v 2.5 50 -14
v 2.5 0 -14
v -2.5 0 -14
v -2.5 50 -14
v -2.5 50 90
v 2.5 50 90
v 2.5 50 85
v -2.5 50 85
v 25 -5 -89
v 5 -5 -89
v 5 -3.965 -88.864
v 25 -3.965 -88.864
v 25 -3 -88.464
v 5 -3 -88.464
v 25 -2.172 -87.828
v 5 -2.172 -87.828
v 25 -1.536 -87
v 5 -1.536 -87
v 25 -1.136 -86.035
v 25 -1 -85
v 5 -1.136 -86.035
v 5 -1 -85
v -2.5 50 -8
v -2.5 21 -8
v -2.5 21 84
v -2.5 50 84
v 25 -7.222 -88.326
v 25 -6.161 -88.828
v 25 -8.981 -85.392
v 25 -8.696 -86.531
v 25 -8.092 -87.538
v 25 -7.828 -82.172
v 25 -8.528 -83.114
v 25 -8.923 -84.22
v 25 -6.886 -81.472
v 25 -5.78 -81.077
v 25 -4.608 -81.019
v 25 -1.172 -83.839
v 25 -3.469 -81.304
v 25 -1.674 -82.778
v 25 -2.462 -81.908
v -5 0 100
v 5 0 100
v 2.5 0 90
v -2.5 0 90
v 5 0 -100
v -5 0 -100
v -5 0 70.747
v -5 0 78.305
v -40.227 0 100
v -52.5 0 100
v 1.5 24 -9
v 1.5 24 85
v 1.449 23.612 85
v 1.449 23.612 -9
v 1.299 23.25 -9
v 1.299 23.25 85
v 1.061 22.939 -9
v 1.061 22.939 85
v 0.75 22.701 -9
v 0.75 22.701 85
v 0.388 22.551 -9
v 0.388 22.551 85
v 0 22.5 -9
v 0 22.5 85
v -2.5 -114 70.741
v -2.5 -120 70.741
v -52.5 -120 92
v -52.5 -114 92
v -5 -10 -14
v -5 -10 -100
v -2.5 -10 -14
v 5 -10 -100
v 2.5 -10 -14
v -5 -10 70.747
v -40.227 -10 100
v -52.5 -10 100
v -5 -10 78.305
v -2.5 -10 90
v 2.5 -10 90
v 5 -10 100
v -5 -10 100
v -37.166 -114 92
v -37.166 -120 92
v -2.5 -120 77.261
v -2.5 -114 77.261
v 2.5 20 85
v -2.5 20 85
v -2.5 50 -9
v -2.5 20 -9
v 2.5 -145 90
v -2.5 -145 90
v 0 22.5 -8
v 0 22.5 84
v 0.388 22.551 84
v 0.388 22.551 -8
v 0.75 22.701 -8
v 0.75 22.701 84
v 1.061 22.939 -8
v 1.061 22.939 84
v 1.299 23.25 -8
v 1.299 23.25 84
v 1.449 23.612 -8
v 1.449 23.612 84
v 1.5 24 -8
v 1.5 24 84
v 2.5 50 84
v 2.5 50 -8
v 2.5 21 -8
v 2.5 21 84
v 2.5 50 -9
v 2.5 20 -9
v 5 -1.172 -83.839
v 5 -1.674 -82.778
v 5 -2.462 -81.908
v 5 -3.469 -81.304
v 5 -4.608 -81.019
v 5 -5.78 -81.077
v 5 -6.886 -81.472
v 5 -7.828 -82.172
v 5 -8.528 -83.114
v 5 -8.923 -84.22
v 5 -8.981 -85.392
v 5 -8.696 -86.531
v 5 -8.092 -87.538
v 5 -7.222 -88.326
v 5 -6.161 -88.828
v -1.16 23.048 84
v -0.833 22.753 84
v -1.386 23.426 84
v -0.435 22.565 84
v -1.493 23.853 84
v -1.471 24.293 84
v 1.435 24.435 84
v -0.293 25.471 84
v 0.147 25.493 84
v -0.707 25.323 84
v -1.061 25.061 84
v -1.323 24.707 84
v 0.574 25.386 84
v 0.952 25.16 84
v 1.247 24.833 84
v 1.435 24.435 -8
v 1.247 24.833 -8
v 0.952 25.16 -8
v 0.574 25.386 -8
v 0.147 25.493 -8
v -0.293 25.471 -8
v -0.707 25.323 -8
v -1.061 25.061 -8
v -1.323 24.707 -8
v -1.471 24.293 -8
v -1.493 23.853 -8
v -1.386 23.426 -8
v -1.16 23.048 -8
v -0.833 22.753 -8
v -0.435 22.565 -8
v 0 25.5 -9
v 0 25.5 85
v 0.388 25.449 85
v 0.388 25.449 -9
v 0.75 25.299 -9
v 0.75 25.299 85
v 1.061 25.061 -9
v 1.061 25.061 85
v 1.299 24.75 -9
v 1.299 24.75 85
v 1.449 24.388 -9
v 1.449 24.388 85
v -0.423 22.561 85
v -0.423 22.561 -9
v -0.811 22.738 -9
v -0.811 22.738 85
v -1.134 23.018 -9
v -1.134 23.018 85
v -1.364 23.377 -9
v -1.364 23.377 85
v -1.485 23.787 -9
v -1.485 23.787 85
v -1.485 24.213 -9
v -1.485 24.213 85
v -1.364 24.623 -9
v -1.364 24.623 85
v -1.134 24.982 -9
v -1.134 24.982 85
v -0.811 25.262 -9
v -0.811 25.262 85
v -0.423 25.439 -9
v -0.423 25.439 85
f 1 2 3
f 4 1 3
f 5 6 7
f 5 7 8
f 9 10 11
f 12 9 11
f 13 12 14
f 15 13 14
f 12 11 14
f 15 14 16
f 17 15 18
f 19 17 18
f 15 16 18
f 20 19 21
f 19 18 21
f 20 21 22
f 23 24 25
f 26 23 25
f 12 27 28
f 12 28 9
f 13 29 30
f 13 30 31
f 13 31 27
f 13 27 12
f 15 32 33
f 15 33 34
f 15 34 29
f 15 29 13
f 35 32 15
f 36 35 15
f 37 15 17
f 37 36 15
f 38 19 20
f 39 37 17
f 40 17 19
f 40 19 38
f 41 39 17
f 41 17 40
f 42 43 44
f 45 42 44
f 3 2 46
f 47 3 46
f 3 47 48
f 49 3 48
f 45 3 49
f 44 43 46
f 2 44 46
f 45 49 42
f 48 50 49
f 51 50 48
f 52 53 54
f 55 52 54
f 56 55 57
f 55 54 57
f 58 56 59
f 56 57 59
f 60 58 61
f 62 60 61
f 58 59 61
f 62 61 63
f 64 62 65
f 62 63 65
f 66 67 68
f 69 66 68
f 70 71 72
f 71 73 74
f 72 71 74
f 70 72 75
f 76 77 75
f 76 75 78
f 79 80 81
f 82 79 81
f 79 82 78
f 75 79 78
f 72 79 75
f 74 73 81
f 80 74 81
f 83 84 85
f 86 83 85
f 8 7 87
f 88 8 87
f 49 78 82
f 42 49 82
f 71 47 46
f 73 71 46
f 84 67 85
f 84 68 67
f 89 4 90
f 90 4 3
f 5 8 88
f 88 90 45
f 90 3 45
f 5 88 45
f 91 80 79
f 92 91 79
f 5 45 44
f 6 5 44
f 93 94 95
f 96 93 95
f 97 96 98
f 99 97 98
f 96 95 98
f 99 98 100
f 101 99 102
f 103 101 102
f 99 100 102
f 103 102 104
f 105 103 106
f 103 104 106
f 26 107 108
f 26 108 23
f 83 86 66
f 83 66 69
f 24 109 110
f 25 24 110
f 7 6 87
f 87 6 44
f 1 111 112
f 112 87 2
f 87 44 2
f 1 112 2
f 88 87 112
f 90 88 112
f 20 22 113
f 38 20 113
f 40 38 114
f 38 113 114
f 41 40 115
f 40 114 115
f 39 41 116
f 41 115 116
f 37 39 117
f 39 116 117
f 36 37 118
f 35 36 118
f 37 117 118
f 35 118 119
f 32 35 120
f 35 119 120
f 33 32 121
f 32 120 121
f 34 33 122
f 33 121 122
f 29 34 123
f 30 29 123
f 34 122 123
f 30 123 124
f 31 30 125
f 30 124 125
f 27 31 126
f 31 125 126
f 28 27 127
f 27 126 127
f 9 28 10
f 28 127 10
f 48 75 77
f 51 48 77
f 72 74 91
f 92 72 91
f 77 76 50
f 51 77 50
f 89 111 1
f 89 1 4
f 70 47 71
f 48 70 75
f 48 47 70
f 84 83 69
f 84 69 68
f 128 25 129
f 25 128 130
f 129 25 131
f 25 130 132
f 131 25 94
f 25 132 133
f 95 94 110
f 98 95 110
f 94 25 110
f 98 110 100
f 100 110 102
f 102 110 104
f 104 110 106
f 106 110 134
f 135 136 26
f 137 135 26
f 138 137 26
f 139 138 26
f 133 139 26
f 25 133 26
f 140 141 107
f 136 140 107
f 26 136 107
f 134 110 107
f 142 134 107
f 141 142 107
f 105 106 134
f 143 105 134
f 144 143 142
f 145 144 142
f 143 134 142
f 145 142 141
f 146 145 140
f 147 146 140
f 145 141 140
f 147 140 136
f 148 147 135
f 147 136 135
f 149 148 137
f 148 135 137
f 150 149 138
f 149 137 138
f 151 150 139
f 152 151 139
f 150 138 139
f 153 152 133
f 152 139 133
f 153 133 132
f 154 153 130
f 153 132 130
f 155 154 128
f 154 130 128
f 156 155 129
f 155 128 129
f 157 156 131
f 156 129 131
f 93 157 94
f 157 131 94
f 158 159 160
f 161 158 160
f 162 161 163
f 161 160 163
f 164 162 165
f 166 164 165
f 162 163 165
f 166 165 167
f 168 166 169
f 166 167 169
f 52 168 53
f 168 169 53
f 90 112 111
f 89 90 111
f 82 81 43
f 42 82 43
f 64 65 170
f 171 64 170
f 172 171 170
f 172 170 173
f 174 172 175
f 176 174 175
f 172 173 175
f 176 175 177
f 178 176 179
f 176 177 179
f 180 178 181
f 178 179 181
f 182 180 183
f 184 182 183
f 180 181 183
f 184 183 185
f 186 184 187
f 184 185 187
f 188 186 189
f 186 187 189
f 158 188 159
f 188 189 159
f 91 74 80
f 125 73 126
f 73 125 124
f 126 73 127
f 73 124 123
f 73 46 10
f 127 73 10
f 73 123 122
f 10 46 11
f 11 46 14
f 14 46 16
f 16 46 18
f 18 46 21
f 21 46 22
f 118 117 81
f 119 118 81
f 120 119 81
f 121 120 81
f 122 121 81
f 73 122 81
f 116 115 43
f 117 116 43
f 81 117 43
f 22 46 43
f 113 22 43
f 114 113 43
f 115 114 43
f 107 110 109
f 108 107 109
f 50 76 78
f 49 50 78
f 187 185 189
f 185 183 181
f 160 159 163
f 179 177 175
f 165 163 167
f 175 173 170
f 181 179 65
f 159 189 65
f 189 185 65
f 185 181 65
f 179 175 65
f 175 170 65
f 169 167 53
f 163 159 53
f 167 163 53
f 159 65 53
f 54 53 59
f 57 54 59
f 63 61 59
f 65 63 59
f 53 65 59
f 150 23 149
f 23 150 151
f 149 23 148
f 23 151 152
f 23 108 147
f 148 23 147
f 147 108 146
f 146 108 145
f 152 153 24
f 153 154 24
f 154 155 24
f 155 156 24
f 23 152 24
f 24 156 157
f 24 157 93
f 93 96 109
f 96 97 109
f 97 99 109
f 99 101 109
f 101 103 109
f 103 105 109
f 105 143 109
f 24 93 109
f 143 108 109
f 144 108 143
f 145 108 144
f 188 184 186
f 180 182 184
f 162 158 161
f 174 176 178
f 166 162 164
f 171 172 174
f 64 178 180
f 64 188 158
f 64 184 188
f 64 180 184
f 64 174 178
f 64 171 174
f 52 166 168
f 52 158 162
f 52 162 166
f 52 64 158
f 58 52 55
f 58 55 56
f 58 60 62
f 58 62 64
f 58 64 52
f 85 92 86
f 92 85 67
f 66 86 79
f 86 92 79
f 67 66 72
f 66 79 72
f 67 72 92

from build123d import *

# Parameters (mm, degrees)
F0_W      = 10
F0_H      = 200
F1_DEPTH  = 10
F3_DEPTH  = 135
F5_DEPTH  = 7.501
F6_W      = 6
F6_H      = 6
F6_H_2    = 7.259
F6_H_3    = 2
F7_DEPTH  = 50
F9_DEPTH  = 6
F10_W     = 5
F10_H     = 10
F10_H_2   = 9.253
F11_DEPTH = 47.5
F13_DEPTH = 10
F15_DEPTH = 20
F17_DEPTH = 50
F19_DEPTH = 5
F21_DEPTH = 92
F23_DEPTH = 94


# Not quite as in the source:
# - a feature names something its author has since deleted; it is built from what else it names


with BuildPart() as f1:
    # F0 (on Front) → F1 (new body)
    with BuildSketch(Plane.XZ):
        Rectangle(F0_W, F0_H)
    extrude(amount=F1_DEPTH)

    # F2 (on face) → F3 (join)
    with BuildSketch(Plane.XZ.offset(10)):
        Polygon((2.5, 90), (0, 90), (-2.5, 90), (-2.5, -14), (0, -14), (2.5, -14), align=None)
    extrude(amount=F3_DEPTH)

    # F4 (on face) → F5 (cut, through all)
    with BuildSketch(Plane.YZ.offset(2.5)):
        Polygon((-10, -14), (-145, 90), (-145, -14), align=None)
    extrude(amount=-F5_DEPTH, mode=Mode.SUBTRACT)

    # F6 (on face) → F7 (join)
    with BuildSketch(Plane(origin=(-2.5, 0, 0), x_dir=(0, -1, 0), z_dir=(-1, 0, 0))):
        with Locations((117, 87)):
            Rectangle(F6_W, F6_H)
        with Locations((117, 73.741)):
            Rectangle(F6_W, F6_H)
        with Locations((117, 80.3705)):
            Rectangle(F6_W, F6_H_2)
        with Locations((117, 91)):
            Rectangle(F6_W, F6_H_3)
    extrude(amount=F7_DEPTH)

    # F8 (on face) → F9 (cut, through all)
    with BuildSketch(Plane.XZ.offset(120)):
        Polygon((-52.5, 70.741), (-2.5, 70.741), (-52.5, 92), align=None)
        Polygon((-37.1657494443, 92), (-2.5, 77.2608166513), (-2.5, 90), (-2.5, 92), align=None)
    extrude(amount=-F9_DEPTH, mode=Mode.SUBTRACT)

    # F10 (on face) → F11 (join)
    with BuildSketch(Plane(origin=(-5, 0, 0), x_dir=(0, -1, 0), z_dir=(-1, 0, 0))):
        with Locations((7.5, 75.747)):
            Rectangle(F10_W, F10_H)
        with Locations((2.5, 75.747)):
            Rectangle(F10_W, F10_H)
        with Locations((2.5, 85.3735)):
            Rectangle(F10_W, F10_H_2)
        with Locations((7.5, 85.3735)):
            Rectangle(F10_W, F10_H_2)
        with Locations((7.5, 95)):
            Rectangle(F10_W, F10_H)
        with Locations((2.5, 95)):
            Rectangle(F10_W, F10_H)
    extrude(amount=F11_DEPTH)

    # F12 (on face) → F13 (cut, through all)
    with BuildSketch(Plane.XZ.offset(10)):
        Polygon((-5, 70.747), (-52.5, 100), (-52.5, 70.747), align=None)
        Polygon((-5, 100), (-40.2273908257, 100), (-5, 78.3051186563), align=None)
    extrude(amount=-F13_DEPTH, mode=Mode.SUBTRACT)

    # F14 (on face) → F15 (join)
    with BuildSketch(Plane.YZ.offset(5)):
        with BuildLine():
            ThreePointArc((-1, -85), (-7.8284271247, -82.1715728753), (-5, -89))
            ThreePointArc((-5, -89), (-2.1715728753, -87.8284271247), (-1, -85))
        make_face()
    extrude(amount=F15_DEPTH)

    # F16 (on face) → F17 (join)
    with BuildSketch(Plane(origin=(0, 0, 0), x_dir=(-1, 0, 0), z_dir=(0, 1, 0))):
        Polygon((2.5, 90), (0, 90), (-2.5, 90), (-2.5, -14), (2.5, -14), align=None)
    extrude(amount=F17_DEPTH)

    # F18 (on face) → F19 (cut, through all)
    with BuildSketch(Plane.YZ.offset(2.5)):
        Polygon((50, 84), (50, 85), (20, 85), (20, -9), (50, -9), (50, -8), (21, -8), (21, 84), align=None)
    extrude(amount=-F19_DEPTH, mode=Mode.SUBTRACT)

    # F20 (on face) → F21 (cut, through all)
    with BuildSketch(Plane.XY.offset(84)):
        with BuildLine():
            ThreePointArc((0, 22.5), (1.0606601718, 22.9393398282), (1.5, 24))
            ThreePointArc((1.5, 24), (-1.0606601718, 25.0606601718), (0, 22.5))
        make_face()
    extrude(amount=-F21_DEPTH, mode=Mode.SUBTRACT)


with BuildPart() as f23:
    # F22 (on face) → F23 (new body, through all)
    with BuildSketch(Plane(origin=(0, 0, 85), x_dir=(1, 0, 0), z_dir=(0, 0, -1))):
        with BuildLine():
            ThreePointArc((1.5, -24), (1.0606601718, -22.9393398282), (0, -22.5))
            Line((0, -22.5), (0, -24))
            Line((0, -24), (0, -25.5))
            ThreePointArc((0, -25.5), (1.0606601718, -25.0606601718), (1.5, -24))
        make_face()
        with BuildLine():
            Line((0, -24), (0, -22.5))
            ThreePointArc((0, -22.5), (-1.5, -24), (0, -25.5))
            Line((0, -25.5), (0, -24))
        make_face()
    extrude(amount=F23_DEPTH)


solid = Compound([f1.part, f23.part])
